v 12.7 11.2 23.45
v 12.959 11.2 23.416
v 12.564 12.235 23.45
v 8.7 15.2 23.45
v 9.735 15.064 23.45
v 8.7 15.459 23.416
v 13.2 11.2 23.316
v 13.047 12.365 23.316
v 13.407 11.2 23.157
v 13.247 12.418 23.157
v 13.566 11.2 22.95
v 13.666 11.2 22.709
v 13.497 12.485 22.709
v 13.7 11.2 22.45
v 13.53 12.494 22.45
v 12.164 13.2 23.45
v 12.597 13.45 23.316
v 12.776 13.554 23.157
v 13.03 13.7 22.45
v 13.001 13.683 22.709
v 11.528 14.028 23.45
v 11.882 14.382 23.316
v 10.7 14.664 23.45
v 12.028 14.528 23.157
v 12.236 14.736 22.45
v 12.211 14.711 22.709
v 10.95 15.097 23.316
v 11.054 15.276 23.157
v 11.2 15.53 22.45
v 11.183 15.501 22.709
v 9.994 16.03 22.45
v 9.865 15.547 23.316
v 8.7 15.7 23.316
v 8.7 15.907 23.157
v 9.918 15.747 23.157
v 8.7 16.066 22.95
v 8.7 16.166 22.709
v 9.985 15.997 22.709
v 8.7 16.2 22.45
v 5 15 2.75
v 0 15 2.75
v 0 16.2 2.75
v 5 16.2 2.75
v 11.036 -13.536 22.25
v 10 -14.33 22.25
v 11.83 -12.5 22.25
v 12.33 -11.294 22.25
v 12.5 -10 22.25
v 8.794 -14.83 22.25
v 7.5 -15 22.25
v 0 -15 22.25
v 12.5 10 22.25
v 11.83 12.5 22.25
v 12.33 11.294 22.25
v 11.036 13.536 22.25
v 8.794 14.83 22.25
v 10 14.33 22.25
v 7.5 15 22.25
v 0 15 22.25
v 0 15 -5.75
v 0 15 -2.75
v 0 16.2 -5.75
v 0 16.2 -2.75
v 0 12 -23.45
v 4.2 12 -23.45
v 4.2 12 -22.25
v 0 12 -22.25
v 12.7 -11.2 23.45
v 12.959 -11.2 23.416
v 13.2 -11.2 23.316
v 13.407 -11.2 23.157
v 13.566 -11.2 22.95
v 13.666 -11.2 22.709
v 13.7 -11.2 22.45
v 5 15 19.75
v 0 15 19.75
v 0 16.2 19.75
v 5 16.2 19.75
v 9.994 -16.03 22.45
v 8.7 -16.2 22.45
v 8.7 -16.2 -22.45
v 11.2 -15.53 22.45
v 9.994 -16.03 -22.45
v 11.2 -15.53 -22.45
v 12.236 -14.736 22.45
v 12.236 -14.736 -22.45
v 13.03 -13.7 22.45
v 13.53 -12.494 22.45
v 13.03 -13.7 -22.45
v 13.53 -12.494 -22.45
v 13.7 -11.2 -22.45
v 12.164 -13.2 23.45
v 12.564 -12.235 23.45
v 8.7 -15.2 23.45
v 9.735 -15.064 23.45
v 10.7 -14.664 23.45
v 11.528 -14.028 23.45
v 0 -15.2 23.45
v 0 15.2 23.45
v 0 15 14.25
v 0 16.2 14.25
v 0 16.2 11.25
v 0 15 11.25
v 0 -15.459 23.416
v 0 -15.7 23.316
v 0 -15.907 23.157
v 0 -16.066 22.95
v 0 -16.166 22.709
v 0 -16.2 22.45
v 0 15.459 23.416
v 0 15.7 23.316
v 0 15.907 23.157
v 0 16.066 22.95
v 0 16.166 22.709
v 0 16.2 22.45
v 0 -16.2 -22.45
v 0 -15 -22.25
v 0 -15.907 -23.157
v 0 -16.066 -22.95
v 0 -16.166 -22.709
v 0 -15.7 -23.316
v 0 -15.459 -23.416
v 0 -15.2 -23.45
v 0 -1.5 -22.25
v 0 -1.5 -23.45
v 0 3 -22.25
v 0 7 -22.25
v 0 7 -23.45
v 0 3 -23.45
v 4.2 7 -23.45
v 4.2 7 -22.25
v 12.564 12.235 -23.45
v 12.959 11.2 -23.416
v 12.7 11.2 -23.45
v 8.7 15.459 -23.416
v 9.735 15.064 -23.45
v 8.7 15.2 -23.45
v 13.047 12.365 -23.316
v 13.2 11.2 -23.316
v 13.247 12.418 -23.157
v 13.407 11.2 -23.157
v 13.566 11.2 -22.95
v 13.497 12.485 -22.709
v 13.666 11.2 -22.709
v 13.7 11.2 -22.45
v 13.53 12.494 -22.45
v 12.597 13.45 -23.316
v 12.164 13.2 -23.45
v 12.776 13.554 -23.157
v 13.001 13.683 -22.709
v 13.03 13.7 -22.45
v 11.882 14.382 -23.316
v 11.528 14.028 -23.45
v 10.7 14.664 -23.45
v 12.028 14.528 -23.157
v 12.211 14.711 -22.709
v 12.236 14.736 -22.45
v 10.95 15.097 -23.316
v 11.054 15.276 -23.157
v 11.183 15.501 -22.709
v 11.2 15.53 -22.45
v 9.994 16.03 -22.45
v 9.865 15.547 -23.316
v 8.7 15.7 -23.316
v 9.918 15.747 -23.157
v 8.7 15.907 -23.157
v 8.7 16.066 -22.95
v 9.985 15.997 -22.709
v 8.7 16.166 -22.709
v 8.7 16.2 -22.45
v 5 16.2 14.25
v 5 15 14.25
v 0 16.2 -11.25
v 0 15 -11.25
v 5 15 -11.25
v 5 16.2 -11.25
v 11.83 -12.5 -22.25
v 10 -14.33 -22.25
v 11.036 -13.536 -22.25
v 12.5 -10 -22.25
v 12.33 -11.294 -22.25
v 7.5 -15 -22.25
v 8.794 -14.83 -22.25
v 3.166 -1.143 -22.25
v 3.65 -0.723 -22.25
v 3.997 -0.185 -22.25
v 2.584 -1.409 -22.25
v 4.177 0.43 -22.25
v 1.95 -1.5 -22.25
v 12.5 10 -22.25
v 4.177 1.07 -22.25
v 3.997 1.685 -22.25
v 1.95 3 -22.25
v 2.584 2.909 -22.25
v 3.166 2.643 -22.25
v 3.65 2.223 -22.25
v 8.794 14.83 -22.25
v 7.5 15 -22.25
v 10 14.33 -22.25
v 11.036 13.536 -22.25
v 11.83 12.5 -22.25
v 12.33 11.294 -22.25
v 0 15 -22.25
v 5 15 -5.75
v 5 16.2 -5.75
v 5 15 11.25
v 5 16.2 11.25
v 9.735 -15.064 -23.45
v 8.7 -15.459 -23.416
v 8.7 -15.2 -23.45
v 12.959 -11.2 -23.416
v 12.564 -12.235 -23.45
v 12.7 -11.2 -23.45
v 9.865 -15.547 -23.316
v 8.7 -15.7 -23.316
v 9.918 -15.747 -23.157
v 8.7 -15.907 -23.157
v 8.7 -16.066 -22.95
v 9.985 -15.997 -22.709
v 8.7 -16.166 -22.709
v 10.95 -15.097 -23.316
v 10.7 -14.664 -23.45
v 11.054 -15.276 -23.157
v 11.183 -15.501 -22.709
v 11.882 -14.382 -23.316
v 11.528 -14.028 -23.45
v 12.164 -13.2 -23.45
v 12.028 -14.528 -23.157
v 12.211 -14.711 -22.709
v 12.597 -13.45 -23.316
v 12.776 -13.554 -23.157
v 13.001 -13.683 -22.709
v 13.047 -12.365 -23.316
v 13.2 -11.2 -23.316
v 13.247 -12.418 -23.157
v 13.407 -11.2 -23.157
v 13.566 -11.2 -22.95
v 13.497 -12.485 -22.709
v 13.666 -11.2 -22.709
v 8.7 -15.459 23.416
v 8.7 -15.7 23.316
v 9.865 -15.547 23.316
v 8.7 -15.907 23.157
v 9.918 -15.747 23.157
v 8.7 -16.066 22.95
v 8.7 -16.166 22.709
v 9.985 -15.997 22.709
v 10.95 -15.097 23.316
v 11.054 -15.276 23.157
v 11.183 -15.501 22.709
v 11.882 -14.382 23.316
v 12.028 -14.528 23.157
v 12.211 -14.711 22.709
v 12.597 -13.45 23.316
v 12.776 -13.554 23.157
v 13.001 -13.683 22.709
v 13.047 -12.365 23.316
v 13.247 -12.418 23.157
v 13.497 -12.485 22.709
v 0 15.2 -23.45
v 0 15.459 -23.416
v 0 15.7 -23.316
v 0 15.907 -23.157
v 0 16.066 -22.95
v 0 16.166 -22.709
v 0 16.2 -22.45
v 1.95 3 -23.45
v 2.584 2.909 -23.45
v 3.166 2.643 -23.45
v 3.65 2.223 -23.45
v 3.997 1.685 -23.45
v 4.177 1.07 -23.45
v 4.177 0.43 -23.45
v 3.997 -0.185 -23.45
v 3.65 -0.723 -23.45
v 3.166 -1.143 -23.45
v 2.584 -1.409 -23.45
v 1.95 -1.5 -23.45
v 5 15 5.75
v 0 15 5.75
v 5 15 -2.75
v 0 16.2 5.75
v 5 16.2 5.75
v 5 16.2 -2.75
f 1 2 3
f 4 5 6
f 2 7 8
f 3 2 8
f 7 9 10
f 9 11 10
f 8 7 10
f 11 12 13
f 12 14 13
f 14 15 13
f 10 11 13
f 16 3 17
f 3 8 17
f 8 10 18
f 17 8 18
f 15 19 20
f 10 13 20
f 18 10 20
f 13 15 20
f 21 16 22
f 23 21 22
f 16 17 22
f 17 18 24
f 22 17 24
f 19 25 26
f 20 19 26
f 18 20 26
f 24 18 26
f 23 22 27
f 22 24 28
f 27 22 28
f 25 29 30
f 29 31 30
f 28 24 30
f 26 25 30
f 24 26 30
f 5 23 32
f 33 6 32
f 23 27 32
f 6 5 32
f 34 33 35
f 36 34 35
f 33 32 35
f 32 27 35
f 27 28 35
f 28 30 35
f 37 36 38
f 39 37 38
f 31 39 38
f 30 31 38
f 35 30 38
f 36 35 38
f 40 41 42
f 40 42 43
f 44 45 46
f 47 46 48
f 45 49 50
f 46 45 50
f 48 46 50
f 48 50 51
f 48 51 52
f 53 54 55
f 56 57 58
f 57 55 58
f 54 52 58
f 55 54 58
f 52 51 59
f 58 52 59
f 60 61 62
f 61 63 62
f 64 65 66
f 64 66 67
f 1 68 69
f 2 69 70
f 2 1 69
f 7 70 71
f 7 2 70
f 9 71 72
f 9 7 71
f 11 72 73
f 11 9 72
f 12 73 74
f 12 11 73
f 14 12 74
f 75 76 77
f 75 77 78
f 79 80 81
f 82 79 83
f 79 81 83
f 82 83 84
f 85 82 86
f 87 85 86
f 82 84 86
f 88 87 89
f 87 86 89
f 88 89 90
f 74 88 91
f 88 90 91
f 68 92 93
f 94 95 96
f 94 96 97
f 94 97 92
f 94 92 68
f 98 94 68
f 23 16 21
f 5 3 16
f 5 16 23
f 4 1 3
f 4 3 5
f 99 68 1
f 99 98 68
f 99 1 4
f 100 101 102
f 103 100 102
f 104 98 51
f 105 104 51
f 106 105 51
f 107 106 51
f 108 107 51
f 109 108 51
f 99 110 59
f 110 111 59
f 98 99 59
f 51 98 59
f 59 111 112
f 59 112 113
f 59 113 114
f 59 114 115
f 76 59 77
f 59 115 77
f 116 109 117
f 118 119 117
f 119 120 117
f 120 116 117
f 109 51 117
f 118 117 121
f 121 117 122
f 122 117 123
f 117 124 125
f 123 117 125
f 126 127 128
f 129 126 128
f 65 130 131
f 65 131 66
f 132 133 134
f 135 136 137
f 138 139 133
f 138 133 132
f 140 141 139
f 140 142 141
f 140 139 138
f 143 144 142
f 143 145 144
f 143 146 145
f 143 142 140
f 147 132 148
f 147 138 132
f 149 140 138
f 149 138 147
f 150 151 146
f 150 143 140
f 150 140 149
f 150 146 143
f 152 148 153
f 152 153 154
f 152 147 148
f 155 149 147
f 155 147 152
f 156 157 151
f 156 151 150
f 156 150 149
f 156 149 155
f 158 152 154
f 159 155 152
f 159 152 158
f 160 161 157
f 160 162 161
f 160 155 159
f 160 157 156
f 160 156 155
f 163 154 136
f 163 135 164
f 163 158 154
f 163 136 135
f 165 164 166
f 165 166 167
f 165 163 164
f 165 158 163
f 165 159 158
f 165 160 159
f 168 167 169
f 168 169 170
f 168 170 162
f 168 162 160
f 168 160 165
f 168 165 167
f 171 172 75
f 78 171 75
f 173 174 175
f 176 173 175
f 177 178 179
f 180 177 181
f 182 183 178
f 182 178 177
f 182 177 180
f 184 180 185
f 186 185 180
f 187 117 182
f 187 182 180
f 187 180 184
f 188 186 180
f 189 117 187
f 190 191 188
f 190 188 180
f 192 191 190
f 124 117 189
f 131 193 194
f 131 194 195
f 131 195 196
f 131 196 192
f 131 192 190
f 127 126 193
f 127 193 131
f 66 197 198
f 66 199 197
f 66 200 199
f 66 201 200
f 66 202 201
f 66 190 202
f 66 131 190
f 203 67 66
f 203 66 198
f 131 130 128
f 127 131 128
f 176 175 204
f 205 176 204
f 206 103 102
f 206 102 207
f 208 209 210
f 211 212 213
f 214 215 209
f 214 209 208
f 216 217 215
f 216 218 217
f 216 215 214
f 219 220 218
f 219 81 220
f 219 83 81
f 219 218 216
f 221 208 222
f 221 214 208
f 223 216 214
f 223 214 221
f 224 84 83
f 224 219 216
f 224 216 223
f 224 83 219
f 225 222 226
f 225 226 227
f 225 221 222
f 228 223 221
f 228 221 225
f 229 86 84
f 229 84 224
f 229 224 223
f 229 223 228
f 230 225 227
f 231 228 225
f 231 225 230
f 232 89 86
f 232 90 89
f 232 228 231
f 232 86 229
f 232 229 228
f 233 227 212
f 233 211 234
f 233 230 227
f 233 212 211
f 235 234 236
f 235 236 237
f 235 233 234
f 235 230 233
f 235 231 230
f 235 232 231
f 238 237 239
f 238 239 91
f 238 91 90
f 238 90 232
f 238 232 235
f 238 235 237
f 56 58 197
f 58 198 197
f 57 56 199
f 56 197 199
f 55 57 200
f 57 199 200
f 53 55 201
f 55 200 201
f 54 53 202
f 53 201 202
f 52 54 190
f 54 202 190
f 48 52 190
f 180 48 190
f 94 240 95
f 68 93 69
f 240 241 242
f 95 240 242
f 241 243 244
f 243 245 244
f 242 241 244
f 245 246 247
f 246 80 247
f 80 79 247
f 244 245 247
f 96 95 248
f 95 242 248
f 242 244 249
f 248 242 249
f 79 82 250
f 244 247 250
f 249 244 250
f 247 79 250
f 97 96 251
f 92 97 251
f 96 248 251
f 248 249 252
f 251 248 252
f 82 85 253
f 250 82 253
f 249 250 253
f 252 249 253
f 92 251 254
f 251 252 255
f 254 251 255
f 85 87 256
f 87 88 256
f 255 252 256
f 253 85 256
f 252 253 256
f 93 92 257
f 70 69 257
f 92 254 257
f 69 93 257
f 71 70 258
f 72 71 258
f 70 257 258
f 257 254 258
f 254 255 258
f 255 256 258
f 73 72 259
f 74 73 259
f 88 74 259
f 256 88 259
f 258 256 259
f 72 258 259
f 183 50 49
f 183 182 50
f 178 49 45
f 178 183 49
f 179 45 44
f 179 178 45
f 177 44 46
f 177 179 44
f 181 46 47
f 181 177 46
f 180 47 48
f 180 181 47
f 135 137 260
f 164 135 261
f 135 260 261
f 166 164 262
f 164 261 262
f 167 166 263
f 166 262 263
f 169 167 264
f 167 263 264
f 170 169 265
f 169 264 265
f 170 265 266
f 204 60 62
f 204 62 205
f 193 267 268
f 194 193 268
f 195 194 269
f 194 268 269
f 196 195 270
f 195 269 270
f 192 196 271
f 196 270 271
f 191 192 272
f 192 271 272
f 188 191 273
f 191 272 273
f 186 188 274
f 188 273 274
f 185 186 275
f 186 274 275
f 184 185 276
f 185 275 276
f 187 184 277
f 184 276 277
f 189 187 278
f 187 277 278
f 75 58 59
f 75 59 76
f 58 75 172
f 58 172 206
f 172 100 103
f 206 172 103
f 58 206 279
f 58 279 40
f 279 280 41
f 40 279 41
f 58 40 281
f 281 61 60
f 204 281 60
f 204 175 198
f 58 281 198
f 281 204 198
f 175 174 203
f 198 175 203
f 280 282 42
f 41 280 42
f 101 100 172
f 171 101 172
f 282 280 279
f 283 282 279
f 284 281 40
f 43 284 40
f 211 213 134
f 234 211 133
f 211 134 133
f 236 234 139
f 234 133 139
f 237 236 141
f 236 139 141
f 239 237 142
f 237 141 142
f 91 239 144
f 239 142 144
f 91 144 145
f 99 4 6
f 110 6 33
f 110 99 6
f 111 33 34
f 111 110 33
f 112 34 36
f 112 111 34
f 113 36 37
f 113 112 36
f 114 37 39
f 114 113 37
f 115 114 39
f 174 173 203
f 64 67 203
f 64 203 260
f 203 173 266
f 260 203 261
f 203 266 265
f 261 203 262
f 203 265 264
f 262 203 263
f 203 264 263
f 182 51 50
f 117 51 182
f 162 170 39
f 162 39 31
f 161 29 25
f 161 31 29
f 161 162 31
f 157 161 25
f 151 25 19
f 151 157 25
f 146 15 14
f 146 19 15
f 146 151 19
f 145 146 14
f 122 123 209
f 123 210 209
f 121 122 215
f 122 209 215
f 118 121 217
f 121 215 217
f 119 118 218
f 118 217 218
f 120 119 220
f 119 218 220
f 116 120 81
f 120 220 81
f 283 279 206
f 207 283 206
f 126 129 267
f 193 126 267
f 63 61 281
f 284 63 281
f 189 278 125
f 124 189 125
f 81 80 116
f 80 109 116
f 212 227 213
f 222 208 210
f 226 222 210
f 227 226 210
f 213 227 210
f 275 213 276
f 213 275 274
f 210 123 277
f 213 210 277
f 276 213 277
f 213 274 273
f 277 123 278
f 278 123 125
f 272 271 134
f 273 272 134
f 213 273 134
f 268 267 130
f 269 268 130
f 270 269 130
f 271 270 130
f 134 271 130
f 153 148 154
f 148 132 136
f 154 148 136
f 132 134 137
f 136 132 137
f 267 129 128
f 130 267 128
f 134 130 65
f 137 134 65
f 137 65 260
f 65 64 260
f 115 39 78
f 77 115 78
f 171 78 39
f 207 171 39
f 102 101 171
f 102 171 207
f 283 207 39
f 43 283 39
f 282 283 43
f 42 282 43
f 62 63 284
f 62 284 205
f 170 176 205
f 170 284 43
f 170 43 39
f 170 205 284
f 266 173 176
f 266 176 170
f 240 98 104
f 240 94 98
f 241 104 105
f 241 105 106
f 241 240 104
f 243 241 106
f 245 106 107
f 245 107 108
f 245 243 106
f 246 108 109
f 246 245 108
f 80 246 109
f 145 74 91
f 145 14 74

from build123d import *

# Parameters (mm, degrees)
SKETCH1_W           = 44.5
SKETCH1_H           = 30
BOSS_EXTRUDE1_DEPTH = 12.5
SHELL2_T            = 1.2
SKETCH2_W           = 5
SKETCH2_H           = 5.5
CUT_EXTRUDE1_DEPTH  = 1.2
SKETCH3_W           = 4.2
SKETCH3_H           = 5
CUT_EXTRUDE2_DEPTH  = 1.2
FILLET1_R           = 5
FILLET3_R           = 1


with BuildPart() as part:
    # Sketch1 → Boss-Extrude1 (new body)
    with BuildSketch(Plane(origin=(0, 0, 0), x_dir=(0, 0, -1), z_dir=(1, 0, 0))):
        Rectangle(SKETCH1_W, SKETCH1_H)
    extrude(amount=BOSS_EXTRUDE1_DEPTH)

    # Shell2
    shell2_openings = [part.faces().sort_by_distance(p)[0] for p in [
        (0, 0, 0),
    ]]
    offset(amount=SHELL2_T, openings=shell2_openings, kind=Kind.INTERSECTION)

    # Sketch2 → Cut-Extrude1 (cut)
    with BuildSketch(Plane.XZ.offset(-15)):
        with Locations((2.5, 17)):
            Rectangle(SKETCH2_W, SKETCH2_H)
        with Locations((2.5, 8.5)):
            Rectangle(SKETCH2_W, SKETCH2_H)
        with Locations((2.5, 0)):
            Rectangle(SKETCH2_W, SKETCH2_H)
        with Locations((2.5, -8.5)):
            Rectangle(SKETCH2_W, SKETCH2_H)
    extrude(amount=-CUT_EXTRUDE1_DEPTH, mode=Mode.SUBTRACT)

    # Sketch3 → Cut-Extrude2 (cut)
    with BuildSketch(Plane(origin=(0, 0, -23.45), x_dir=(-1, 0, 0), z_dir=(0, 0, -1))):
        with BuildLine():
            Line((0, 3), (-1.95, 3))
            ThreePointArc((-1.95, 3), (-4.2, 0.75), (-1.95, -1.5))
            Line((-1.95, -1.5), (0, -1.5))
            Line((0, -1.5), (0, 3))
        make_face()
        with Locations((-2.1, 9.5)):
            Rectangle(SKETCH3_W, SKETCH3_H)
    extrude(amount=-CUT_EXTRUDE2_DEPTH, mode=Mode.SUBTRACT)

    # Fillet1
    fillet1_edges = [part.edges().sort_by_distance(p)[0] for p in [
        (13.7, -16.2, 0),
        (12.5, 15, 0),
        (12.5, -15, 0),
        (13.7, 16.2, 0),
    ]]
    fillet(fillet1_edges, radius=FILLET1_R)

    # Fillet3
    fillet3_edges = [part.edges().sort_by_distance(p)[0] for p in [
        (13.7, 0, -23.45),
        (13.7, 0, 23.45),
        (4.35, 16.2, -23.45),
        (4.35, -16.2, -23.45),
        (12.235533906, 14.735533906, -23.45),
        (12.235533906, -14.735533906, -23.45),
        (4.35, -16.2, 23.45),
        (4.35, 16.2, 23.45),
        (12.235533906, 14.735533906, 23.45),
        (12.235533906, -14.735533906, 23.45),
    ]]
    fillet(fillet3_edges, radius=FILLET3_R)


solid = part.part
